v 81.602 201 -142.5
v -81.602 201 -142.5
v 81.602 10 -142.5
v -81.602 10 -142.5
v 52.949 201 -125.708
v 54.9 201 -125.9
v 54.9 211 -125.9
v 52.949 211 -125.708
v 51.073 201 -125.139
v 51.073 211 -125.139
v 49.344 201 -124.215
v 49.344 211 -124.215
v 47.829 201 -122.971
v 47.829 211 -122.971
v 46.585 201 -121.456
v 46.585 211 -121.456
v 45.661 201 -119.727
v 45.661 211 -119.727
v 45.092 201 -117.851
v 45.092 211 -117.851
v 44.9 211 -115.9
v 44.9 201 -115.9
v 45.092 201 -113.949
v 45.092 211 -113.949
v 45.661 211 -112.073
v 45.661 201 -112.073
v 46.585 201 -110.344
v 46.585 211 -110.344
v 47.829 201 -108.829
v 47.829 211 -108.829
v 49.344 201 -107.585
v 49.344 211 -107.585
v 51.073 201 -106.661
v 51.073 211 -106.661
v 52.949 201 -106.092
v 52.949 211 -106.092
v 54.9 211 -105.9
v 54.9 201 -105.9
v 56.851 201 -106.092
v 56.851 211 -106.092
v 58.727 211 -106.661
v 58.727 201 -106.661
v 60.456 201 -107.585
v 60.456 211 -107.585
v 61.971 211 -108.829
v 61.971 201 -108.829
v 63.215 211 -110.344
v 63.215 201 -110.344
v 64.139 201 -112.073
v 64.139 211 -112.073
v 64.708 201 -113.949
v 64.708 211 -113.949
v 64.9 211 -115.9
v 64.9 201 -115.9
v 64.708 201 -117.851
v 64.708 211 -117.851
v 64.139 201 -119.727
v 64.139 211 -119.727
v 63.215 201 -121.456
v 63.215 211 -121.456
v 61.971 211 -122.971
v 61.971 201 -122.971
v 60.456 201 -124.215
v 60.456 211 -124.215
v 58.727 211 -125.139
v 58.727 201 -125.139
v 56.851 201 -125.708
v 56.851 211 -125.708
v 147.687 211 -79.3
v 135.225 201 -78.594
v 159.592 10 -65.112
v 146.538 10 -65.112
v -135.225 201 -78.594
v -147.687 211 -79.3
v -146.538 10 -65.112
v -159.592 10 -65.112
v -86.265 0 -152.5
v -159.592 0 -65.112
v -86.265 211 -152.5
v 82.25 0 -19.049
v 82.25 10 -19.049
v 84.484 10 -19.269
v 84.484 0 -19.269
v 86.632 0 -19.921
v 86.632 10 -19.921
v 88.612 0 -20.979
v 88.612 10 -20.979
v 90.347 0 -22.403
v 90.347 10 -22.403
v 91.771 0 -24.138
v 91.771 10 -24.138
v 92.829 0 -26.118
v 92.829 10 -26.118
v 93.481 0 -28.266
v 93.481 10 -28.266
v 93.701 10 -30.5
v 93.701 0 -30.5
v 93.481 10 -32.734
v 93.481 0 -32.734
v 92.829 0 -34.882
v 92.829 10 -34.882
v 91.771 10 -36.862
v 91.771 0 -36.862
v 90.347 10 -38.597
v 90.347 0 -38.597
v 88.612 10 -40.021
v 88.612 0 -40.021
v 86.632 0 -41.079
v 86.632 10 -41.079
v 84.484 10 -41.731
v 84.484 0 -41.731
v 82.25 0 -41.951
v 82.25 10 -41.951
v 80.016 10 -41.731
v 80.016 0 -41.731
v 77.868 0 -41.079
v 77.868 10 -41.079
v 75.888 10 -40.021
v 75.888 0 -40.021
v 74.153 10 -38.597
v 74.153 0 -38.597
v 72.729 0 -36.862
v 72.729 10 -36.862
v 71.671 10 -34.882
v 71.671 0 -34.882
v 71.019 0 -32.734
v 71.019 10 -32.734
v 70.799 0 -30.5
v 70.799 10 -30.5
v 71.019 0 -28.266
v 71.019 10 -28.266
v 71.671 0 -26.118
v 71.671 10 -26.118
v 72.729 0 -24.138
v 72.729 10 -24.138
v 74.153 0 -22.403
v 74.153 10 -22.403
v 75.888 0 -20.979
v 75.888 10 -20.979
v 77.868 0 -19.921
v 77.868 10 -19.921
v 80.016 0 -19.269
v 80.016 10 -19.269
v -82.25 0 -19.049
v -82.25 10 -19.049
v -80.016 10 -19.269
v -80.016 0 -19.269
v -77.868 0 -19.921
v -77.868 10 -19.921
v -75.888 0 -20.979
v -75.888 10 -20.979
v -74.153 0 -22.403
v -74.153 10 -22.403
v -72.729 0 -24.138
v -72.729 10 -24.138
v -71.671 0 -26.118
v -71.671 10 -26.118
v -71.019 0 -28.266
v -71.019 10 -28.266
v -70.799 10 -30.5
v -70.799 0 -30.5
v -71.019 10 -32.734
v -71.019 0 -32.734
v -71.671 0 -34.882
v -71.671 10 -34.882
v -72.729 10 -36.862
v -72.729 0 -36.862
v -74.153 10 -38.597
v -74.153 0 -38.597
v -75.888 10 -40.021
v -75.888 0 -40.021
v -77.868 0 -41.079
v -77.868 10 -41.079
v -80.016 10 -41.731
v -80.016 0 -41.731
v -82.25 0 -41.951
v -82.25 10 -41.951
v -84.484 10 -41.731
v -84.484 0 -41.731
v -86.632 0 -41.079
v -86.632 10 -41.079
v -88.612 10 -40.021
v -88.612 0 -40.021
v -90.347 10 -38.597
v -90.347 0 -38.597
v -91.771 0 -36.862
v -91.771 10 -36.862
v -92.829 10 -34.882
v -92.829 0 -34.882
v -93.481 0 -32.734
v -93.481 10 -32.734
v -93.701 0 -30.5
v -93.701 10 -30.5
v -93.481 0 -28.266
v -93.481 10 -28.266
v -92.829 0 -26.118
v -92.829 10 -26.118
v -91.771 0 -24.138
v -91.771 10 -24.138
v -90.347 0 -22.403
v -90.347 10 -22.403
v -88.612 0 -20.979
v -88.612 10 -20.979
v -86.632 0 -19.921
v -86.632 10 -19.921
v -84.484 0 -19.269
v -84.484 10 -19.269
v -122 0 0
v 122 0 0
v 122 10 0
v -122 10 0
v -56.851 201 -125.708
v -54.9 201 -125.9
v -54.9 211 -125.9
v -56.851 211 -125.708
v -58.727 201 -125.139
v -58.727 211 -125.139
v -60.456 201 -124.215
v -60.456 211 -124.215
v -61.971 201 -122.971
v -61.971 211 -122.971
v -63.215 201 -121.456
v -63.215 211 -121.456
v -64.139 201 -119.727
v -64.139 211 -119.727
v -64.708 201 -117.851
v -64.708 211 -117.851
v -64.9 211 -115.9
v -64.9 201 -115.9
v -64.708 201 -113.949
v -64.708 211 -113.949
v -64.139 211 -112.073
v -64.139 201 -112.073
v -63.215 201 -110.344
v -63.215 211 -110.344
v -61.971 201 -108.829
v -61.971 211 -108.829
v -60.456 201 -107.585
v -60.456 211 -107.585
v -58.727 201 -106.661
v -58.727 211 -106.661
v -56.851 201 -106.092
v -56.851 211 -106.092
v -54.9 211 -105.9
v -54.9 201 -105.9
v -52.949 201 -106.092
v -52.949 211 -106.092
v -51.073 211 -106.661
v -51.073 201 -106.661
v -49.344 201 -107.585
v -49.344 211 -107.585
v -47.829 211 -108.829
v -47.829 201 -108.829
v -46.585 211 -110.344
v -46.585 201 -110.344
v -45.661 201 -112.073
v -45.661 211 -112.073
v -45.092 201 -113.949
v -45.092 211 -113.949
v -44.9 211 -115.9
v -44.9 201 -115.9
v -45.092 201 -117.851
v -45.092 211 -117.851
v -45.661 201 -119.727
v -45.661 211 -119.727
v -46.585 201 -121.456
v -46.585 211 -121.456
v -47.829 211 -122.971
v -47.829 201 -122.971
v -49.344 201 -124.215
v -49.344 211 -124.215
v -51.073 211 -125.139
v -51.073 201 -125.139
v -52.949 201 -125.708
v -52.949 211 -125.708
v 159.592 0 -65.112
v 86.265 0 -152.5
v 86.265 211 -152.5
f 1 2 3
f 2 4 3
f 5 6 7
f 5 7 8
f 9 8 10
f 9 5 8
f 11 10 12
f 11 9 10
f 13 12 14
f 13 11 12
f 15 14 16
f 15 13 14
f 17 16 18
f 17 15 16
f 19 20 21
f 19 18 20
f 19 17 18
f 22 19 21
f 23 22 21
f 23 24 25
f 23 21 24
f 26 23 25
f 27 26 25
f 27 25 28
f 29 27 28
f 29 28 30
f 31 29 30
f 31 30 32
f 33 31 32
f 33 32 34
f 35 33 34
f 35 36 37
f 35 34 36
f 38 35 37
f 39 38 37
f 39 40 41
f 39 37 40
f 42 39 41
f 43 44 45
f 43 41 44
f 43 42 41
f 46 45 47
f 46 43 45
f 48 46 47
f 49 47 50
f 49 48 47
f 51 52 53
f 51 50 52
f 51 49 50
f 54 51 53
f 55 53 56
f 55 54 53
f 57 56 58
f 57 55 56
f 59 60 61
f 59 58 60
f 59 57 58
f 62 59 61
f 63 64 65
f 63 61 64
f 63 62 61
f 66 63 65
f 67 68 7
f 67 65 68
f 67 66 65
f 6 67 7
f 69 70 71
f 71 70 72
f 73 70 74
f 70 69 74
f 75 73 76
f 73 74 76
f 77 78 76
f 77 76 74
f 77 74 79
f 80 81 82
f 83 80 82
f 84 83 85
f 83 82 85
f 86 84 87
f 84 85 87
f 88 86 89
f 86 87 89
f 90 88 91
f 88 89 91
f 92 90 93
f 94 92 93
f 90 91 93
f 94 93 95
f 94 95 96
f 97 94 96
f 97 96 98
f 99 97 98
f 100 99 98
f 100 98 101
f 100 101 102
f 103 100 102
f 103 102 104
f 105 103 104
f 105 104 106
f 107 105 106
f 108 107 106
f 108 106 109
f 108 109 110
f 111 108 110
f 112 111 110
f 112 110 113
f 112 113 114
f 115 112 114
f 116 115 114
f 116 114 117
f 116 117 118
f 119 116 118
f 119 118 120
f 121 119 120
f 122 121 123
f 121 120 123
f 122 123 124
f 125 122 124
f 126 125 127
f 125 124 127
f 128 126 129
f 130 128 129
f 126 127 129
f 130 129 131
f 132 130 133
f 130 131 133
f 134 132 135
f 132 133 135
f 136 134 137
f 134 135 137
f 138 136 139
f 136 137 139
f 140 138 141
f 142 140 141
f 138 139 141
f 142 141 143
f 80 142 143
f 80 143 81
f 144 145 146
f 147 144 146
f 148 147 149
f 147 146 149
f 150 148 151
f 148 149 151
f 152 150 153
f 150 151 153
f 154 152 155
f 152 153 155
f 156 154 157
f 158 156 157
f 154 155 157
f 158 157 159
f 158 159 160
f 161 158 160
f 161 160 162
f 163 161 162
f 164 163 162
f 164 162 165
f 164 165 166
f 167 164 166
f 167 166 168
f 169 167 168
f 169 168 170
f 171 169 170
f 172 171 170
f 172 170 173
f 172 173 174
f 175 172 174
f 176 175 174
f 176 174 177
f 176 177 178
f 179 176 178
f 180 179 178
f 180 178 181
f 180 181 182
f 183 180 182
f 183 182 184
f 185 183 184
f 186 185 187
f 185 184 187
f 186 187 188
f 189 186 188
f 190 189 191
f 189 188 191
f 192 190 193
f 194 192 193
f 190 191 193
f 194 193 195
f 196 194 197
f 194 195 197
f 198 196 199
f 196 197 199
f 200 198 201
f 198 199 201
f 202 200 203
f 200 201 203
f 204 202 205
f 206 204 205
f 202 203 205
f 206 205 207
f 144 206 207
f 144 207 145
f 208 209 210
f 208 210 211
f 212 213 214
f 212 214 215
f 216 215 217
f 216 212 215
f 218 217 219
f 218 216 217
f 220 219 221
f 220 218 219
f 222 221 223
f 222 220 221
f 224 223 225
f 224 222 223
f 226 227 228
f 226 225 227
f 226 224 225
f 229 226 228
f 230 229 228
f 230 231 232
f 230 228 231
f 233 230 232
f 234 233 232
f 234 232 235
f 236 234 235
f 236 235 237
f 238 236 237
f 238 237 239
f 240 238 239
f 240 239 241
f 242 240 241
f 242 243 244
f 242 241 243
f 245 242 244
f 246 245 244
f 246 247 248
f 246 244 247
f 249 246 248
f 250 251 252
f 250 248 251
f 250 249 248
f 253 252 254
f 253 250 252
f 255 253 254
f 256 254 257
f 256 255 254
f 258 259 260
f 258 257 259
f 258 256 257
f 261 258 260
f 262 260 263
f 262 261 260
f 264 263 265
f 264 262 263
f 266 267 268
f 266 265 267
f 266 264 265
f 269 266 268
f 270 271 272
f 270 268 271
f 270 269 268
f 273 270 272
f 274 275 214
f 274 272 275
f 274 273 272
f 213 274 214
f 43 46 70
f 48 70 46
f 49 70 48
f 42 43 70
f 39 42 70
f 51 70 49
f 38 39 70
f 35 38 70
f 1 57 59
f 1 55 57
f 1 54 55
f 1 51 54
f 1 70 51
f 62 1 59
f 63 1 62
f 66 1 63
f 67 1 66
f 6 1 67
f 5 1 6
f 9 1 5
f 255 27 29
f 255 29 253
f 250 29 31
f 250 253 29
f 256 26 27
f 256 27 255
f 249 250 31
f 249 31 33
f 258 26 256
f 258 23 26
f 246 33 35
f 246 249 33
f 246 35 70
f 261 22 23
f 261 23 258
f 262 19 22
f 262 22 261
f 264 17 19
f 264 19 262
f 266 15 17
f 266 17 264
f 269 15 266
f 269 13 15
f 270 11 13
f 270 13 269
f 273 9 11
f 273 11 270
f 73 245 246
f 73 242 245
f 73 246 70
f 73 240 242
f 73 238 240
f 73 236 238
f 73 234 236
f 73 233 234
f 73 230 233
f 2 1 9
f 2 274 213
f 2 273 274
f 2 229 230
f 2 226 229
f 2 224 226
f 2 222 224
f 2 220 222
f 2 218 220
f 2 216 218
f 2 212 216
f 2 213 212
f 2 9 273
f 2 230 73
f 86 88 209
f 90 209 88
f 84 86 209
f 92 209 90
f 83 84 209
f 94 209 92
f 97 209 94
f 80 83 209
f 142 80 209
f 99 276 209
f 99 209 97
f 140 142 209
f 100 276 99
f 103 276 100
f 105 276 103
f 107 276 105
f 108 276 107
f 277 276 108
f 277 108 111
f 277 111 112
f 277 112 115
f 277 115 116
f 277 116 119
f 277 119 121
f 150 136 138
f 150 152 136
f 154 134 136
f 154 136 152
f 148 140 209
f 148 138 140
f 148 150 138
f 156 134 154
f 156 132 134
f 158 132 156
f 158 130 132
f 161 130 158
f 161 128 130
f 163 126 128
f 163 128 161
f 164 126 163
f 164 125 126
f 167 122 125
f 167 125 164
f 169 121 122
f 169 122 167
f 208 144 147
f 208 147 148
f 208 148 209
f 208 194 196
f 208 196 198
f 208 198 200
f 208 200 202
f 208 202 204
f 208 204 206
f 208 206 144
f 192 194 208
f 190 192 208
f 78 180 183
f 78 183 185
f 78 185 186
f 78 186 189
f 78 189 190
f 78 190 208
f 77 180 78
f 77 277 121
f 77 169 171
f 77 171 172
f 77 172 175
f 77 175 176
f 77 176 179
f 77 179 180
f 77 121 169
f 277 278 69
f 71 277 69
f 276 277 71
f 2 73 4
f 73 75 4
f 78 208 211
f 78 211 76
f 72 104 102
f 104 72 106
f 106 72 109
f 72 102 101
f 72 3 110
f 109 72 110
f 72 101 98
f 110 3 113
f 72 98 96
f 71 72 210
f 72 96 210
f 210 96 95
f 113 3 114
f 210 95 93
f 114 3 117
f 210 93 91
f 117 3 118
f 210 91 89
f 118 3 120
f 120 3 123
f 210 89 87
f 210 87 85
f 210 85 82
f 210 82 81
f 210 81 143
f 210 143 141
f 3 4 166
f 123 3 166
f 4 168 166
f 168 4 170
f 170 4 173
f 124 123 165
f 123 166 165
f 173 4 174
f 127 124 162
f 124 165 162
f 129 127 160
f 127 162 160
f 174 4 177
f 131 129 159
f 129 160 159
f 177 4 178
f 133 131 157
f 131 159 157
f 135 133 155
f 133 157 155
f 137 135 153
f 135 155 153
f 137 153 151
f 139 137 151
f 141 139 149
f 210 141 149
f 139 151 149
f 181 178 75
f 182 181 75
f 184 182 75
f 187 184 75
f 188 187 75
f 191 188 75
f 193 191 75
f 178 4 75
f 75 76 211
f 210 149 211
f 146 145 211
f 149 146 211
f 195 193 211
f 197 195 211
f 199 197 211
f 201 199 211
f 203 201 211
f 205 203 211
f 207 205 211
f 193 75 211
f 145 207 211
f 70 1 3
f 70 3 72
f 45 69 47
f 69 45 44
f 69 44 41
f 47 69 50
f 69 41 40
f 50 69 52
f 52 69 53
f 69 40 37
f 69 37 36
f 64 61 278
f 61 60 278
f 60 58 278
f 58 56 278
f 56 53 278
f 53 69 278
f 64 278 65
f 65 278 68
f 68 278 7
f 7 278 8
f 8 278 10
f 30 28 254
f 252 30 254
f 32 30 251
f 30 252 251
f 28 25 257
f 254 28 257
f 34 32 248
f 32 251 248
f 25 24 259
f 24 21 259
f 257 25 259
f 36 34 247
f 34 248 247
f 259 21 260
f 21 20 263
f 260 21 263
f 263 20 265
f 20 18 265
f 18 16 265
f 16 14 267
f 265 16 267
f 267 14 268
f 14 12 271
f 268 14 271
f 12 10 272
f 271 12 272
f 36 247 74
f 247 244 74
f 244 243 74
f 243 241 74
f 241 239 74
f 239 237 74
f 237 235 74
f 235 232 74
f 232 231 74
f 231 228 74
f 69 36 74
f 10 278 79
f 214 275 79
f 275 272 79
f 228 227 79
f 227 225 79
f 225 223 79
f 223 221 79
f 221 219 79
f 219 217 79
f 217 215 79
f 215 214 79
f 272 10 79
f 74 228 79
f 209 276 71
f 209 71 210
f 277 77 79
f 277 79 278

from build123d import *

# Parameters (mm, degrees)
EXTRUDE_1_DEPTH          = 211
SHELL_1_T                = 10
CUT_EXTRUDE_1_DEPTH      = 306.363666708
CUT_EXTRUDE_1_DEPTH_BACK = 306.363666708
CUT_EXTRUDE_2_DEPTH      = 306.363666708
CUT_EXTRUDE_2_DEPTH_BACK = 40
SKETCH_3_R               = 10
SKETCH_4_R               = 11.451002367
CUT_EXTRUDE_3_DEPTH      = 40


with BuildPart() as part:
    # 草图1 → 凸台-拉伸1 (new body)
    with BuildSketch(Plane(origin=(0, 0, 0), x_dir=(1, 0, 0), z_dir=(0, 1, 0))):
        Polygon((122, 0), (-122, 0), (-159.592352403, 65.111864338), (-86.265, 152.5), (86.265, 152.5), (159.592352403, 65.111864338), align=None)
    extrude(amount=EXTRUDE_1_DEPTH)

    # 抽壳1 (no face opened: a closed hollow body)
    add(offset(amount=-SHELL_1_T, mode=Mode.PRIVATE), mode=Mode.SUBTRACT)

    # 草图2 → 切除-拉伸1 (cut, two sides: drawn at the far end of the back side and taken through both)
    with BuildSketch(Plane(origin=(0, 0, 0), x_dir=(0, 0, -1), z_dir=(1, 0, 0)).offset(-CUT_EXTRUDE_1_DEPTH_BACK)):
        Polygon((79.3, 211), (65.111864338, 10), (0, 10), (0, 211), align=None)
    extrude(amount=CUT_EXTRUDE_1_DEPTH + CUT_EXTRUDE_1_DEPTH_BACK, mode=Mode.SUBTRACT)

    # 草图3 → 切除-拉伸2 (cut, two sides: drawn at the far end of the back side and taken through both)
    with BuildSketch(Plane(origin=(0, 211, 0), x_dir=(1, 0, 0), z_dir=(0, 1, 0)).offset(-CUT_EXTRUDE_2_DEPTH_BACK)):
        with Locations(Location((-54.9, 115.9, 0), (0, 0, 90))):
            Circle(SKETCH_3_R)
        with Locations(Location((54.9, 115.9, 0), (0, 0, 90))):
            Circle(SKETCH_3_R)
    extrude(amount=CUT_EXTRUDE_2_DEPTH + CUT_EXTRUDE_2_DEPTH_BACK, mode=Mode.SUBTRACT)

    # 草图4 → 切除-拉伸3 (cut)
    with BuildSketch(Plane(origin=(0, 10, 0), x_dir=(1, 0, 0), z_dir=(0, 1, 0))):
        with Locations(Location((-82.25, 30.5, 0), (0, 0, 270))):
            Circle(SKETCH_4_R)
        with Locations(Location((82.25, 30.5, 0), (0, 0, 270))):
            Circle(SKETCH_4_R)
    extrude(amount=-CUT_EXTRUDE_3_DEPTH, mode=Mode.SUBTRACT)


solid = part.part
